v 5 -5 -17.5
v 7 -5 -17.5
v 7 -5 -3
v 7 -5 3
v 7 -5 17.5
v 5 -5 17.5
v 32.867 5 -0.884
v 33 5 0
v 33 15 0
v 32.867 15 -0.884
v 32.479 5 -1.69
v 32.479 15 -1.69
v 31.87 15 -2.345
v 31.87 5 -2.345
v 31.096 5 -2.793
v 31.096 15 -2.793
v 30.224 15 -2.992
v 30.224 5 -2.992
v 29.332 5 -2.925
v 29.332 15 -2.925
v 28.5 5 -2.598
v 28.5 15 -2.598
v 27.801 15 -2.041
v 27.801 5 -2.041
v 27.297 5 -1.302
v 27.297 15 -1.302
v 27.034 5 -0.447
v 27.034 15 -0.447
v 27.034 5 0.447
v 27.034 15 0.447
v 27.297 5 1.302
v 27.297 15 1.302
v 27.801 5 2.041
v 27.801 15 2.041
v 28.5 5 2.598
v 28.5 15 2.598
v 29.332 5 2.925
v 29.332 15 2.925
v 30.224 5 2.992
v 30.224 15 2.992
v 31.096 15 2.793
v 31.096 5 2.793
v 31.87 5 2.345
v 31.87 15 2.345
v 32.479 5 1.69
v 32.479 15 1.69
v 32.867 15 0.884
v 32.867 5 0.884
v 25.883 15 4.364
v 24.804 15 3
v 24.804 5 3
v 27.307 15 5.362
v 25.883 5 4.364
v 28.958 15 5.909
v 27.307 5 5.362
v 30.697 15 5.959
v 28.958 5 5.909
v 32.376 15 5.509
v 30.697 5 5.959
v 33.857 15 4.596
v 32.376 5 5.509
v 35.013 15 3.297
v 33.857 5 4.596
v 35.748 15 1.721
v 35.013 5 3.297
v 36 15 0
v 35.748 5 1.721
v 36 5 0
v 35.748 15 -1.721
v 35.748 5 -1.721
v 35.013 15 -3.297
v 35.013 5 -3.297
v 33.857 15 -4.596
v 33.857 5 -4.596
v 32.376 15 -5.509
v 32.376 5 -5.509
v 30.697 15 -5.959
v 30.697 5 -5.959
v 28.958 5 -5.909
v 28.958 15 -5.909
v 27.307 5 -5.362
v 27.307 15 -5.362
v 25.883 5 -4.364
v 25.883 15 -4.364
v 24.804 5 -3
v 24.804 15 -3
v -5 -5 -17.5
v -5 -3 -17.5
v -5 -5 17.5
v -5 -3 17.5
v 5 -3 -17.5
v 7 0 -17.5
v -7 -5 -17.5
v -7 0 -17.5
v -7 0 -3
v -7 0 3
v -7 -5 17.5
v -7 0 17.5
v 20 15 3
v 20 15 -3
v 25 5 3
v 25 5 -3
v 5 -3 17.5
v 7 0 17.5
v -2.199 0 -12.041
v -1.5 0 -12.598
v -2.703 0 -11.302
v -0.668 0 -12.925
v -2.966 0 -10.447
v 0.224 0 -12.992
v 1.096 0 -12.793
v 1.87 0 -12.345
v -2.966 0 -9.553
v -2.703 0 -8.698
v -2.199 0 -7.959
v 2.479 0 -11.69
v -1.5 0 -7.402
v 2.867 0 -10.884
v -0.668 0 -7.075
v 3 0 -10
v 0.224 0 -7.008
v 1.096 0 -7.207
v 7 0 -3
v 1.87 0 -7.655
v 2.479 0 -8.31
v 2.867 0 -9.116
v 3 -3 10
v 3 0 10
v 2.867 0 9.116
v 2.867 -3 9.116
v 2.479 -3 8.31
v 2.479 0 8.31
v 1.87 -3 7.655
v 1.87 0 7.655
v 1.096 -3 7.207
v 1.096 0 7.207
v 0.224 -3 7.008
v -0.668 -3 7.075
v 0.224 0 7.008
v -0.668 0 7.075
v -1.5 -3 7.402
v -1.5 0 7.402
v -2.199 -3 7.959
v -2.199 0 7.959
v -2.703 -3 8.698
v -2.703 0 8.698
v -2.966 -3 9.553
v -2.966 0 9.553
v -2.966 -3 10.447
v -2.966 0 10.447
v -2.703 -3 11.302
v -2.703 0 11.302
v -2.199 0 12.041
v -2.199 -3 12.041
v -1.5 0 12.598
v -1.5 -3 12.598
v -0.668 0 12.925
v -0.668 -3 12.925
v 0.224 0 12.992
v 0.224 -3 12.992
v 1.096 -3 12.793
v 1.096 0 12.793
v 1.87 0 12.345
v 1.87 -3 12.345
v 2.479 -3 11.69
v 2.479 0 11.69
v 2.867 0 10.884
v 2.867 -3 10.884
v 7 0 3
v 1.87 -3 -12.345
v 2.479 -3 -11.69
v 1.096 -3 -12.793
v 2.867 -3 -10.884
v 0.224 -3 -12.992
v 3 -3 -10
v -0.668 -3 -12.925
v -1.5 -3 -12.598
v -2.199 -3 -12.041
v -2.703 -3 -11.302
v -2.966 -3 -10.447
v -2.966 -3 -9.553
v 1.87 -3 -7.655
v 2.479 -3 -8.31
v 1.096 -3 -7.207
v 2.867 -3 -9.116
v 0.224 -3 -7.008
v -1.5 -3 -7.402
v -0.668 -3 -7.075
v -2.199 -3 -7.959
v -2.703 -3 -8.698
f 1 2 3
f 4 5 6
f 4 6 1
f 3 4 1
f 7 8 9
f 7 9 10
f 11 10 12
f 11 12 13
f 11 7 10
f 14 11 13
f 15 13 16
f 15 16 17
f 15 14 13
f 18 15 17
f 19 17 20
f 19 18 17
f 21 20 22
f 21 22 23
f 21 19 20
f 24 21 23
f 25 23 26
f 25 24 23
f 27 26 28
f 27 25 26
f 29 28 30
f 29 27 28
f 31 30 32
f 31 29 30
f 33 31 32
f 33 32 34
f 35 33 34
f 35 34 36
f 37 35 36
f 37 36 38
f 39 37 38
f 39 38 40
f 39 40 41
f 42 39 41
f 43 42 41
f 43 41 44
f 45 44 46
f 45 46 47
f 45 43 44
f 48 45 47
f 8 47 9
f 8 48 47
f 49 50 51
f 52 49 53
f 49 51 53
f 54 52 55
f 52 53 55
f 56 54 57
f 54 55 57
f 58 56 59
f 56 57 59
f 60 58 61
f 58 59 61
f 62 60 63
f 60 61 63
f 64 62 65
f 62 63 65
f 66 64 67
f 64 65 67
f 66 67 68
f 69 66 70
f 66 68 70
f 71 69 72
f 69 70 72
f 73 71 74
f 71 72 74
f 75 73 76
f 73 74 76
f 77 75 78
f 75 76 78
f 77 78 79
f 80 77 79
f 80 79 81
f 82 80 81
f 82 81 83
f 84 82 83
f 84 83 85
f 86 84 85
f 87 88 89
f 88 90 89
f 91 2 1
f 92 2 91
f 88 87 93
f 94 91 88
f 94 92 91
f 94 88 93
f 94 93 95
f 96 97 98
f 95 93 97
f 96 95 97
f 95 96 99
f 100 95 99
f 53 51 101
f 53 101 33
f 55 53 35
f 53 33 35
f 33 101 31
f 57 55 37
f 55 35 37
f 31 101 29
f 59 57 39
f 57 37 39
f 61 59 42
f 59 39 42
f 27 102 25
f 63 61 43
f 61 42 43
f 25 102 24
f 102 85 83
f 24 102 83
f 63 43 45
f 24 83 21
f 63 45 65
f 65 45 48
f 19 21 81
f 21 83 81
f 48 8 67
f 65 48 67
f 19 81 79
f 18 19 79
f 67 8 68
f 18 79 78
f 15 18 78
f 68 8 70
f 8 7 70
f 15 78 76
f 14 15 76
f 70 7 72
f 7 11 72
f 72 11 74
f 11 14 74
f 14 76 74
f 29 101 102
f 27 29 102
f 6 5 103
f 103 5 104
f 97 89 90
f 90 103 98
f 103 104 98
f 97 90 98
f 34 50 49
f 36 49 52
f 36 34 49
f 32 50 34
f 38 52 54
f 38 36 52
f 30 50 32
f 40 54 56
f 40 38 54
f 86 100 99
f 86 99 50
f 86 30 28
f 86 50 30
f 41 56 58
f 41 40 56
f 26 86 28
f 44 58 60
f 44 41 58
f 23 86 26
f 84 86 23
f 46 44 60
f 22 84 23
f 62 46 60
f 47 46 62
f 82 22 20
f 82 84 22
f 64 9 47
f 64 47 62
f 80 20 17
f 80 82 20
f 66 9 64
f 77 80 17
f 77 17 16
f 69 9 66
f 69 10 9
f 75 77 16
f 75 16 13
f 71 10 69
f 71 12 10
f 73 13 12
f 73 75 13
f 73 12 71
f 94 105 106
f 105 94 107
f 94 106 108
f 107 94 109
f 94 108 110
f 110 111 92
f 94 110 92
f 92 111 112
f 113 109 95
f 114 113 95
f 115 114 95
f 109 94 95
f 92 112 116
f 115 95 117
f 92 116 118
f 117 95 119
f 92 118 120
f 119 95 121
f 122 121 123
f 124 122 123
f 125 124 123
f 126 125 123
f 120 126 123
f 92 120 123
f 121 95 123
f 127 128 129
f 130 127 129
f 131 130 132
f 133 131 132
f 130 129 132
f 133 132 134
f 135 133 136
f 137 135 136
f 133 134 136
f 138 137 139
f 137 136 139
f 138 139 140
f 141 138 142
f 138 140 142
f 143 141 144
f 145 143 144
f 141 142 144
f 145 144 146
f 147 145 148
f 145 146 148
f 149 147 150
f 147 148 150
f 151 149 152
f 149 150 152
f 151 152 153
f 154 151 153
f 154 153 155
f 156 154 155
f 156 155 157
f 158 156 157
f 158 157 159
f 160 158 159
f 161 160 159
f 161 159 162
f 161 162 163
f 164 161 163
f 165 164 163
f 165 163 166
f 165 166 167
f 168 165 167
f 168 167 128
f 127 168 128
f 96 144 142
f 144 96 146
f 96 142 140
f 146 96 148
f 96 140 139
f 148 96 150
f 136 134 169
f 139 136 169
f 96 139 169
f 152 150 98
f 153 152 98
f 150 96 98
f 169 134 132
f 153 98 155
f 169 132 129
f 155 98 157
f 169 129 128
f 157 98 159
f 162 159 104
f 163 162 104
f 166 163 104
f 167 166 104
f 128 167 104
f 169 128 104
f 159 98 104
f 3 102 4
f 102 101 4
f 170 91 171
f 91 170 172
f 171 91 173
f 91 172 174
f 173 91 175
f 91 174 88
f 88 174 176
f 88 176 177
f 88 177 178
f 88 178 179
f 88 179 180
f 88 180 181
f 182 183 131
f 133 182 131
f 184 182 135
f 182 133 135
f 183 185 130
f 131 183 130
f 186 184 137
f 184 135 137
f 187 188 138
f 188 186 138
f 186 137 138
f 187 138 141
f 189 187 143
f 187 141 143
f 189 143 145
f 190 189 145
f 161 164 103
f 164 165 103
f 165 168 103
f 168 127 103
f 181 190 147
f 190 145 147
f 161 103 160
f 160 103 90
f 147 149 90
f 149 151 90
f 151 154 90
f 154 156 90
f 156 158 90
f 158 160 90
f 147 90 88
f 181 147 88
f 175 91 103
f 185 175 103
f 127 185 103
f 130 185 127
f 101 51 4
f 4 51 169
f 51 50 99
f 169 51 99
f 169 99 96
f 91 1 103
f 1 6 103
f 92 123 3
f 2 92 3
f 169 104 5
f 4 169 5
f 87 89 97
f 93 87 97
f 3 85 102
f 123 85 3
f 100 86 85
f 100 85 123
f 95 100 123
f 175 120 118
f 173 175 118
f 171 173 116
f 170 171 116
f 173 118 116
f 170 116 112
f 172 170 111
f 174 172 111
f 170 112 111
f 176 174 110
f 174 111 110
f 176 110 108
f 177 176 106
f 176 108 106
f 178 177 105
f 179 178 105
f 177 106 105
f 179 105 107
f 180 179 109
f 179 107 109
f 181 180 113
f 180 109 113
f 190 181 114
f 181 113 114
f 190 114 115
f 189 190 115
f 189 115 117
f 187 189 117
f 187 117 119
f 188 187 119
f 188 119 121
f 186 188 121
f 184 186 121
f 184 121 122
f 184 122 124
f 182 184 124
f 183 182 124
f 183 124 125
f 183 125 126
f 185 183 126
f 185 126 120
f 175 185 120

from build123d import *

# Parameters (mm, degrees)
EXTRUDE_1_DEPTH     = 17.5
EXTRUDE_2_DEPTH     = 3
EXTRUDE_START       = 5
SKETCH_5_R          = 6
SKETCH_5_R_2        = 3
EXTRUDE_3_DEPTH     = 10
SKETCH_2_R          = 3
CUT_EXTRUDE_1_DEPTH = 6


with BuildPart() as part:
    # 草圖1 → 填料-伸長1 (new body, symmetric)
    with BuildSketch(Plane.XY):
        Polygon((-7, 0), (7, 0), (7, -5), (5, -5), (5, -3), (-5, -3), (-5, -5), (-7, -5), align=None)
    extrude(amount=EXTRUDE_1_DEPTH, both=True)

    # 草圖4 → 填料-伸長2 (add, symmetric)
    with BuildSketch(Plane.XY):
        Polygon((-7, 0), (20, 15), (25, 15), (25, 5), (7, -5), (7, 0), align=None)
    extrude(amount=EXTRUDE_2_DEPTH, both=True)

    # 草圖5 → 填料-伸長3 (add)
    with BuildSketch(Plane(origin=(0, 0, 0), x_dir=(1, 0, 0), z_dir=(0, 1, 0)).offset(EXTRUDE_START)):
        with Locations((30, 0)):
            Circle(SKETCH_5_R)
        with Locations((30, 0)):
            Circle(SKETCH_5_R_2, mode=Mode.SUBTRACT)
    extrude(amount=EXTRUDE_3_DEPTH)

    # 草圖2 → 除料-伸長1 (cut, through all)
    with BuildSketch(Plane(origin=(0, 0, 0), x_dir=(1, 0, 0), z_dir=(0, 1, 0))):
        with Locations((0, -10)):
            Circle(SKETCH_2_R)
        with Locations((0, 10)):
            Circle(SKETCH_2_R)
    extrude(amount=-CUT_EXTRUDE_1_DEPTH, mode=Mode.SUBTRACT)


solid = part.part
